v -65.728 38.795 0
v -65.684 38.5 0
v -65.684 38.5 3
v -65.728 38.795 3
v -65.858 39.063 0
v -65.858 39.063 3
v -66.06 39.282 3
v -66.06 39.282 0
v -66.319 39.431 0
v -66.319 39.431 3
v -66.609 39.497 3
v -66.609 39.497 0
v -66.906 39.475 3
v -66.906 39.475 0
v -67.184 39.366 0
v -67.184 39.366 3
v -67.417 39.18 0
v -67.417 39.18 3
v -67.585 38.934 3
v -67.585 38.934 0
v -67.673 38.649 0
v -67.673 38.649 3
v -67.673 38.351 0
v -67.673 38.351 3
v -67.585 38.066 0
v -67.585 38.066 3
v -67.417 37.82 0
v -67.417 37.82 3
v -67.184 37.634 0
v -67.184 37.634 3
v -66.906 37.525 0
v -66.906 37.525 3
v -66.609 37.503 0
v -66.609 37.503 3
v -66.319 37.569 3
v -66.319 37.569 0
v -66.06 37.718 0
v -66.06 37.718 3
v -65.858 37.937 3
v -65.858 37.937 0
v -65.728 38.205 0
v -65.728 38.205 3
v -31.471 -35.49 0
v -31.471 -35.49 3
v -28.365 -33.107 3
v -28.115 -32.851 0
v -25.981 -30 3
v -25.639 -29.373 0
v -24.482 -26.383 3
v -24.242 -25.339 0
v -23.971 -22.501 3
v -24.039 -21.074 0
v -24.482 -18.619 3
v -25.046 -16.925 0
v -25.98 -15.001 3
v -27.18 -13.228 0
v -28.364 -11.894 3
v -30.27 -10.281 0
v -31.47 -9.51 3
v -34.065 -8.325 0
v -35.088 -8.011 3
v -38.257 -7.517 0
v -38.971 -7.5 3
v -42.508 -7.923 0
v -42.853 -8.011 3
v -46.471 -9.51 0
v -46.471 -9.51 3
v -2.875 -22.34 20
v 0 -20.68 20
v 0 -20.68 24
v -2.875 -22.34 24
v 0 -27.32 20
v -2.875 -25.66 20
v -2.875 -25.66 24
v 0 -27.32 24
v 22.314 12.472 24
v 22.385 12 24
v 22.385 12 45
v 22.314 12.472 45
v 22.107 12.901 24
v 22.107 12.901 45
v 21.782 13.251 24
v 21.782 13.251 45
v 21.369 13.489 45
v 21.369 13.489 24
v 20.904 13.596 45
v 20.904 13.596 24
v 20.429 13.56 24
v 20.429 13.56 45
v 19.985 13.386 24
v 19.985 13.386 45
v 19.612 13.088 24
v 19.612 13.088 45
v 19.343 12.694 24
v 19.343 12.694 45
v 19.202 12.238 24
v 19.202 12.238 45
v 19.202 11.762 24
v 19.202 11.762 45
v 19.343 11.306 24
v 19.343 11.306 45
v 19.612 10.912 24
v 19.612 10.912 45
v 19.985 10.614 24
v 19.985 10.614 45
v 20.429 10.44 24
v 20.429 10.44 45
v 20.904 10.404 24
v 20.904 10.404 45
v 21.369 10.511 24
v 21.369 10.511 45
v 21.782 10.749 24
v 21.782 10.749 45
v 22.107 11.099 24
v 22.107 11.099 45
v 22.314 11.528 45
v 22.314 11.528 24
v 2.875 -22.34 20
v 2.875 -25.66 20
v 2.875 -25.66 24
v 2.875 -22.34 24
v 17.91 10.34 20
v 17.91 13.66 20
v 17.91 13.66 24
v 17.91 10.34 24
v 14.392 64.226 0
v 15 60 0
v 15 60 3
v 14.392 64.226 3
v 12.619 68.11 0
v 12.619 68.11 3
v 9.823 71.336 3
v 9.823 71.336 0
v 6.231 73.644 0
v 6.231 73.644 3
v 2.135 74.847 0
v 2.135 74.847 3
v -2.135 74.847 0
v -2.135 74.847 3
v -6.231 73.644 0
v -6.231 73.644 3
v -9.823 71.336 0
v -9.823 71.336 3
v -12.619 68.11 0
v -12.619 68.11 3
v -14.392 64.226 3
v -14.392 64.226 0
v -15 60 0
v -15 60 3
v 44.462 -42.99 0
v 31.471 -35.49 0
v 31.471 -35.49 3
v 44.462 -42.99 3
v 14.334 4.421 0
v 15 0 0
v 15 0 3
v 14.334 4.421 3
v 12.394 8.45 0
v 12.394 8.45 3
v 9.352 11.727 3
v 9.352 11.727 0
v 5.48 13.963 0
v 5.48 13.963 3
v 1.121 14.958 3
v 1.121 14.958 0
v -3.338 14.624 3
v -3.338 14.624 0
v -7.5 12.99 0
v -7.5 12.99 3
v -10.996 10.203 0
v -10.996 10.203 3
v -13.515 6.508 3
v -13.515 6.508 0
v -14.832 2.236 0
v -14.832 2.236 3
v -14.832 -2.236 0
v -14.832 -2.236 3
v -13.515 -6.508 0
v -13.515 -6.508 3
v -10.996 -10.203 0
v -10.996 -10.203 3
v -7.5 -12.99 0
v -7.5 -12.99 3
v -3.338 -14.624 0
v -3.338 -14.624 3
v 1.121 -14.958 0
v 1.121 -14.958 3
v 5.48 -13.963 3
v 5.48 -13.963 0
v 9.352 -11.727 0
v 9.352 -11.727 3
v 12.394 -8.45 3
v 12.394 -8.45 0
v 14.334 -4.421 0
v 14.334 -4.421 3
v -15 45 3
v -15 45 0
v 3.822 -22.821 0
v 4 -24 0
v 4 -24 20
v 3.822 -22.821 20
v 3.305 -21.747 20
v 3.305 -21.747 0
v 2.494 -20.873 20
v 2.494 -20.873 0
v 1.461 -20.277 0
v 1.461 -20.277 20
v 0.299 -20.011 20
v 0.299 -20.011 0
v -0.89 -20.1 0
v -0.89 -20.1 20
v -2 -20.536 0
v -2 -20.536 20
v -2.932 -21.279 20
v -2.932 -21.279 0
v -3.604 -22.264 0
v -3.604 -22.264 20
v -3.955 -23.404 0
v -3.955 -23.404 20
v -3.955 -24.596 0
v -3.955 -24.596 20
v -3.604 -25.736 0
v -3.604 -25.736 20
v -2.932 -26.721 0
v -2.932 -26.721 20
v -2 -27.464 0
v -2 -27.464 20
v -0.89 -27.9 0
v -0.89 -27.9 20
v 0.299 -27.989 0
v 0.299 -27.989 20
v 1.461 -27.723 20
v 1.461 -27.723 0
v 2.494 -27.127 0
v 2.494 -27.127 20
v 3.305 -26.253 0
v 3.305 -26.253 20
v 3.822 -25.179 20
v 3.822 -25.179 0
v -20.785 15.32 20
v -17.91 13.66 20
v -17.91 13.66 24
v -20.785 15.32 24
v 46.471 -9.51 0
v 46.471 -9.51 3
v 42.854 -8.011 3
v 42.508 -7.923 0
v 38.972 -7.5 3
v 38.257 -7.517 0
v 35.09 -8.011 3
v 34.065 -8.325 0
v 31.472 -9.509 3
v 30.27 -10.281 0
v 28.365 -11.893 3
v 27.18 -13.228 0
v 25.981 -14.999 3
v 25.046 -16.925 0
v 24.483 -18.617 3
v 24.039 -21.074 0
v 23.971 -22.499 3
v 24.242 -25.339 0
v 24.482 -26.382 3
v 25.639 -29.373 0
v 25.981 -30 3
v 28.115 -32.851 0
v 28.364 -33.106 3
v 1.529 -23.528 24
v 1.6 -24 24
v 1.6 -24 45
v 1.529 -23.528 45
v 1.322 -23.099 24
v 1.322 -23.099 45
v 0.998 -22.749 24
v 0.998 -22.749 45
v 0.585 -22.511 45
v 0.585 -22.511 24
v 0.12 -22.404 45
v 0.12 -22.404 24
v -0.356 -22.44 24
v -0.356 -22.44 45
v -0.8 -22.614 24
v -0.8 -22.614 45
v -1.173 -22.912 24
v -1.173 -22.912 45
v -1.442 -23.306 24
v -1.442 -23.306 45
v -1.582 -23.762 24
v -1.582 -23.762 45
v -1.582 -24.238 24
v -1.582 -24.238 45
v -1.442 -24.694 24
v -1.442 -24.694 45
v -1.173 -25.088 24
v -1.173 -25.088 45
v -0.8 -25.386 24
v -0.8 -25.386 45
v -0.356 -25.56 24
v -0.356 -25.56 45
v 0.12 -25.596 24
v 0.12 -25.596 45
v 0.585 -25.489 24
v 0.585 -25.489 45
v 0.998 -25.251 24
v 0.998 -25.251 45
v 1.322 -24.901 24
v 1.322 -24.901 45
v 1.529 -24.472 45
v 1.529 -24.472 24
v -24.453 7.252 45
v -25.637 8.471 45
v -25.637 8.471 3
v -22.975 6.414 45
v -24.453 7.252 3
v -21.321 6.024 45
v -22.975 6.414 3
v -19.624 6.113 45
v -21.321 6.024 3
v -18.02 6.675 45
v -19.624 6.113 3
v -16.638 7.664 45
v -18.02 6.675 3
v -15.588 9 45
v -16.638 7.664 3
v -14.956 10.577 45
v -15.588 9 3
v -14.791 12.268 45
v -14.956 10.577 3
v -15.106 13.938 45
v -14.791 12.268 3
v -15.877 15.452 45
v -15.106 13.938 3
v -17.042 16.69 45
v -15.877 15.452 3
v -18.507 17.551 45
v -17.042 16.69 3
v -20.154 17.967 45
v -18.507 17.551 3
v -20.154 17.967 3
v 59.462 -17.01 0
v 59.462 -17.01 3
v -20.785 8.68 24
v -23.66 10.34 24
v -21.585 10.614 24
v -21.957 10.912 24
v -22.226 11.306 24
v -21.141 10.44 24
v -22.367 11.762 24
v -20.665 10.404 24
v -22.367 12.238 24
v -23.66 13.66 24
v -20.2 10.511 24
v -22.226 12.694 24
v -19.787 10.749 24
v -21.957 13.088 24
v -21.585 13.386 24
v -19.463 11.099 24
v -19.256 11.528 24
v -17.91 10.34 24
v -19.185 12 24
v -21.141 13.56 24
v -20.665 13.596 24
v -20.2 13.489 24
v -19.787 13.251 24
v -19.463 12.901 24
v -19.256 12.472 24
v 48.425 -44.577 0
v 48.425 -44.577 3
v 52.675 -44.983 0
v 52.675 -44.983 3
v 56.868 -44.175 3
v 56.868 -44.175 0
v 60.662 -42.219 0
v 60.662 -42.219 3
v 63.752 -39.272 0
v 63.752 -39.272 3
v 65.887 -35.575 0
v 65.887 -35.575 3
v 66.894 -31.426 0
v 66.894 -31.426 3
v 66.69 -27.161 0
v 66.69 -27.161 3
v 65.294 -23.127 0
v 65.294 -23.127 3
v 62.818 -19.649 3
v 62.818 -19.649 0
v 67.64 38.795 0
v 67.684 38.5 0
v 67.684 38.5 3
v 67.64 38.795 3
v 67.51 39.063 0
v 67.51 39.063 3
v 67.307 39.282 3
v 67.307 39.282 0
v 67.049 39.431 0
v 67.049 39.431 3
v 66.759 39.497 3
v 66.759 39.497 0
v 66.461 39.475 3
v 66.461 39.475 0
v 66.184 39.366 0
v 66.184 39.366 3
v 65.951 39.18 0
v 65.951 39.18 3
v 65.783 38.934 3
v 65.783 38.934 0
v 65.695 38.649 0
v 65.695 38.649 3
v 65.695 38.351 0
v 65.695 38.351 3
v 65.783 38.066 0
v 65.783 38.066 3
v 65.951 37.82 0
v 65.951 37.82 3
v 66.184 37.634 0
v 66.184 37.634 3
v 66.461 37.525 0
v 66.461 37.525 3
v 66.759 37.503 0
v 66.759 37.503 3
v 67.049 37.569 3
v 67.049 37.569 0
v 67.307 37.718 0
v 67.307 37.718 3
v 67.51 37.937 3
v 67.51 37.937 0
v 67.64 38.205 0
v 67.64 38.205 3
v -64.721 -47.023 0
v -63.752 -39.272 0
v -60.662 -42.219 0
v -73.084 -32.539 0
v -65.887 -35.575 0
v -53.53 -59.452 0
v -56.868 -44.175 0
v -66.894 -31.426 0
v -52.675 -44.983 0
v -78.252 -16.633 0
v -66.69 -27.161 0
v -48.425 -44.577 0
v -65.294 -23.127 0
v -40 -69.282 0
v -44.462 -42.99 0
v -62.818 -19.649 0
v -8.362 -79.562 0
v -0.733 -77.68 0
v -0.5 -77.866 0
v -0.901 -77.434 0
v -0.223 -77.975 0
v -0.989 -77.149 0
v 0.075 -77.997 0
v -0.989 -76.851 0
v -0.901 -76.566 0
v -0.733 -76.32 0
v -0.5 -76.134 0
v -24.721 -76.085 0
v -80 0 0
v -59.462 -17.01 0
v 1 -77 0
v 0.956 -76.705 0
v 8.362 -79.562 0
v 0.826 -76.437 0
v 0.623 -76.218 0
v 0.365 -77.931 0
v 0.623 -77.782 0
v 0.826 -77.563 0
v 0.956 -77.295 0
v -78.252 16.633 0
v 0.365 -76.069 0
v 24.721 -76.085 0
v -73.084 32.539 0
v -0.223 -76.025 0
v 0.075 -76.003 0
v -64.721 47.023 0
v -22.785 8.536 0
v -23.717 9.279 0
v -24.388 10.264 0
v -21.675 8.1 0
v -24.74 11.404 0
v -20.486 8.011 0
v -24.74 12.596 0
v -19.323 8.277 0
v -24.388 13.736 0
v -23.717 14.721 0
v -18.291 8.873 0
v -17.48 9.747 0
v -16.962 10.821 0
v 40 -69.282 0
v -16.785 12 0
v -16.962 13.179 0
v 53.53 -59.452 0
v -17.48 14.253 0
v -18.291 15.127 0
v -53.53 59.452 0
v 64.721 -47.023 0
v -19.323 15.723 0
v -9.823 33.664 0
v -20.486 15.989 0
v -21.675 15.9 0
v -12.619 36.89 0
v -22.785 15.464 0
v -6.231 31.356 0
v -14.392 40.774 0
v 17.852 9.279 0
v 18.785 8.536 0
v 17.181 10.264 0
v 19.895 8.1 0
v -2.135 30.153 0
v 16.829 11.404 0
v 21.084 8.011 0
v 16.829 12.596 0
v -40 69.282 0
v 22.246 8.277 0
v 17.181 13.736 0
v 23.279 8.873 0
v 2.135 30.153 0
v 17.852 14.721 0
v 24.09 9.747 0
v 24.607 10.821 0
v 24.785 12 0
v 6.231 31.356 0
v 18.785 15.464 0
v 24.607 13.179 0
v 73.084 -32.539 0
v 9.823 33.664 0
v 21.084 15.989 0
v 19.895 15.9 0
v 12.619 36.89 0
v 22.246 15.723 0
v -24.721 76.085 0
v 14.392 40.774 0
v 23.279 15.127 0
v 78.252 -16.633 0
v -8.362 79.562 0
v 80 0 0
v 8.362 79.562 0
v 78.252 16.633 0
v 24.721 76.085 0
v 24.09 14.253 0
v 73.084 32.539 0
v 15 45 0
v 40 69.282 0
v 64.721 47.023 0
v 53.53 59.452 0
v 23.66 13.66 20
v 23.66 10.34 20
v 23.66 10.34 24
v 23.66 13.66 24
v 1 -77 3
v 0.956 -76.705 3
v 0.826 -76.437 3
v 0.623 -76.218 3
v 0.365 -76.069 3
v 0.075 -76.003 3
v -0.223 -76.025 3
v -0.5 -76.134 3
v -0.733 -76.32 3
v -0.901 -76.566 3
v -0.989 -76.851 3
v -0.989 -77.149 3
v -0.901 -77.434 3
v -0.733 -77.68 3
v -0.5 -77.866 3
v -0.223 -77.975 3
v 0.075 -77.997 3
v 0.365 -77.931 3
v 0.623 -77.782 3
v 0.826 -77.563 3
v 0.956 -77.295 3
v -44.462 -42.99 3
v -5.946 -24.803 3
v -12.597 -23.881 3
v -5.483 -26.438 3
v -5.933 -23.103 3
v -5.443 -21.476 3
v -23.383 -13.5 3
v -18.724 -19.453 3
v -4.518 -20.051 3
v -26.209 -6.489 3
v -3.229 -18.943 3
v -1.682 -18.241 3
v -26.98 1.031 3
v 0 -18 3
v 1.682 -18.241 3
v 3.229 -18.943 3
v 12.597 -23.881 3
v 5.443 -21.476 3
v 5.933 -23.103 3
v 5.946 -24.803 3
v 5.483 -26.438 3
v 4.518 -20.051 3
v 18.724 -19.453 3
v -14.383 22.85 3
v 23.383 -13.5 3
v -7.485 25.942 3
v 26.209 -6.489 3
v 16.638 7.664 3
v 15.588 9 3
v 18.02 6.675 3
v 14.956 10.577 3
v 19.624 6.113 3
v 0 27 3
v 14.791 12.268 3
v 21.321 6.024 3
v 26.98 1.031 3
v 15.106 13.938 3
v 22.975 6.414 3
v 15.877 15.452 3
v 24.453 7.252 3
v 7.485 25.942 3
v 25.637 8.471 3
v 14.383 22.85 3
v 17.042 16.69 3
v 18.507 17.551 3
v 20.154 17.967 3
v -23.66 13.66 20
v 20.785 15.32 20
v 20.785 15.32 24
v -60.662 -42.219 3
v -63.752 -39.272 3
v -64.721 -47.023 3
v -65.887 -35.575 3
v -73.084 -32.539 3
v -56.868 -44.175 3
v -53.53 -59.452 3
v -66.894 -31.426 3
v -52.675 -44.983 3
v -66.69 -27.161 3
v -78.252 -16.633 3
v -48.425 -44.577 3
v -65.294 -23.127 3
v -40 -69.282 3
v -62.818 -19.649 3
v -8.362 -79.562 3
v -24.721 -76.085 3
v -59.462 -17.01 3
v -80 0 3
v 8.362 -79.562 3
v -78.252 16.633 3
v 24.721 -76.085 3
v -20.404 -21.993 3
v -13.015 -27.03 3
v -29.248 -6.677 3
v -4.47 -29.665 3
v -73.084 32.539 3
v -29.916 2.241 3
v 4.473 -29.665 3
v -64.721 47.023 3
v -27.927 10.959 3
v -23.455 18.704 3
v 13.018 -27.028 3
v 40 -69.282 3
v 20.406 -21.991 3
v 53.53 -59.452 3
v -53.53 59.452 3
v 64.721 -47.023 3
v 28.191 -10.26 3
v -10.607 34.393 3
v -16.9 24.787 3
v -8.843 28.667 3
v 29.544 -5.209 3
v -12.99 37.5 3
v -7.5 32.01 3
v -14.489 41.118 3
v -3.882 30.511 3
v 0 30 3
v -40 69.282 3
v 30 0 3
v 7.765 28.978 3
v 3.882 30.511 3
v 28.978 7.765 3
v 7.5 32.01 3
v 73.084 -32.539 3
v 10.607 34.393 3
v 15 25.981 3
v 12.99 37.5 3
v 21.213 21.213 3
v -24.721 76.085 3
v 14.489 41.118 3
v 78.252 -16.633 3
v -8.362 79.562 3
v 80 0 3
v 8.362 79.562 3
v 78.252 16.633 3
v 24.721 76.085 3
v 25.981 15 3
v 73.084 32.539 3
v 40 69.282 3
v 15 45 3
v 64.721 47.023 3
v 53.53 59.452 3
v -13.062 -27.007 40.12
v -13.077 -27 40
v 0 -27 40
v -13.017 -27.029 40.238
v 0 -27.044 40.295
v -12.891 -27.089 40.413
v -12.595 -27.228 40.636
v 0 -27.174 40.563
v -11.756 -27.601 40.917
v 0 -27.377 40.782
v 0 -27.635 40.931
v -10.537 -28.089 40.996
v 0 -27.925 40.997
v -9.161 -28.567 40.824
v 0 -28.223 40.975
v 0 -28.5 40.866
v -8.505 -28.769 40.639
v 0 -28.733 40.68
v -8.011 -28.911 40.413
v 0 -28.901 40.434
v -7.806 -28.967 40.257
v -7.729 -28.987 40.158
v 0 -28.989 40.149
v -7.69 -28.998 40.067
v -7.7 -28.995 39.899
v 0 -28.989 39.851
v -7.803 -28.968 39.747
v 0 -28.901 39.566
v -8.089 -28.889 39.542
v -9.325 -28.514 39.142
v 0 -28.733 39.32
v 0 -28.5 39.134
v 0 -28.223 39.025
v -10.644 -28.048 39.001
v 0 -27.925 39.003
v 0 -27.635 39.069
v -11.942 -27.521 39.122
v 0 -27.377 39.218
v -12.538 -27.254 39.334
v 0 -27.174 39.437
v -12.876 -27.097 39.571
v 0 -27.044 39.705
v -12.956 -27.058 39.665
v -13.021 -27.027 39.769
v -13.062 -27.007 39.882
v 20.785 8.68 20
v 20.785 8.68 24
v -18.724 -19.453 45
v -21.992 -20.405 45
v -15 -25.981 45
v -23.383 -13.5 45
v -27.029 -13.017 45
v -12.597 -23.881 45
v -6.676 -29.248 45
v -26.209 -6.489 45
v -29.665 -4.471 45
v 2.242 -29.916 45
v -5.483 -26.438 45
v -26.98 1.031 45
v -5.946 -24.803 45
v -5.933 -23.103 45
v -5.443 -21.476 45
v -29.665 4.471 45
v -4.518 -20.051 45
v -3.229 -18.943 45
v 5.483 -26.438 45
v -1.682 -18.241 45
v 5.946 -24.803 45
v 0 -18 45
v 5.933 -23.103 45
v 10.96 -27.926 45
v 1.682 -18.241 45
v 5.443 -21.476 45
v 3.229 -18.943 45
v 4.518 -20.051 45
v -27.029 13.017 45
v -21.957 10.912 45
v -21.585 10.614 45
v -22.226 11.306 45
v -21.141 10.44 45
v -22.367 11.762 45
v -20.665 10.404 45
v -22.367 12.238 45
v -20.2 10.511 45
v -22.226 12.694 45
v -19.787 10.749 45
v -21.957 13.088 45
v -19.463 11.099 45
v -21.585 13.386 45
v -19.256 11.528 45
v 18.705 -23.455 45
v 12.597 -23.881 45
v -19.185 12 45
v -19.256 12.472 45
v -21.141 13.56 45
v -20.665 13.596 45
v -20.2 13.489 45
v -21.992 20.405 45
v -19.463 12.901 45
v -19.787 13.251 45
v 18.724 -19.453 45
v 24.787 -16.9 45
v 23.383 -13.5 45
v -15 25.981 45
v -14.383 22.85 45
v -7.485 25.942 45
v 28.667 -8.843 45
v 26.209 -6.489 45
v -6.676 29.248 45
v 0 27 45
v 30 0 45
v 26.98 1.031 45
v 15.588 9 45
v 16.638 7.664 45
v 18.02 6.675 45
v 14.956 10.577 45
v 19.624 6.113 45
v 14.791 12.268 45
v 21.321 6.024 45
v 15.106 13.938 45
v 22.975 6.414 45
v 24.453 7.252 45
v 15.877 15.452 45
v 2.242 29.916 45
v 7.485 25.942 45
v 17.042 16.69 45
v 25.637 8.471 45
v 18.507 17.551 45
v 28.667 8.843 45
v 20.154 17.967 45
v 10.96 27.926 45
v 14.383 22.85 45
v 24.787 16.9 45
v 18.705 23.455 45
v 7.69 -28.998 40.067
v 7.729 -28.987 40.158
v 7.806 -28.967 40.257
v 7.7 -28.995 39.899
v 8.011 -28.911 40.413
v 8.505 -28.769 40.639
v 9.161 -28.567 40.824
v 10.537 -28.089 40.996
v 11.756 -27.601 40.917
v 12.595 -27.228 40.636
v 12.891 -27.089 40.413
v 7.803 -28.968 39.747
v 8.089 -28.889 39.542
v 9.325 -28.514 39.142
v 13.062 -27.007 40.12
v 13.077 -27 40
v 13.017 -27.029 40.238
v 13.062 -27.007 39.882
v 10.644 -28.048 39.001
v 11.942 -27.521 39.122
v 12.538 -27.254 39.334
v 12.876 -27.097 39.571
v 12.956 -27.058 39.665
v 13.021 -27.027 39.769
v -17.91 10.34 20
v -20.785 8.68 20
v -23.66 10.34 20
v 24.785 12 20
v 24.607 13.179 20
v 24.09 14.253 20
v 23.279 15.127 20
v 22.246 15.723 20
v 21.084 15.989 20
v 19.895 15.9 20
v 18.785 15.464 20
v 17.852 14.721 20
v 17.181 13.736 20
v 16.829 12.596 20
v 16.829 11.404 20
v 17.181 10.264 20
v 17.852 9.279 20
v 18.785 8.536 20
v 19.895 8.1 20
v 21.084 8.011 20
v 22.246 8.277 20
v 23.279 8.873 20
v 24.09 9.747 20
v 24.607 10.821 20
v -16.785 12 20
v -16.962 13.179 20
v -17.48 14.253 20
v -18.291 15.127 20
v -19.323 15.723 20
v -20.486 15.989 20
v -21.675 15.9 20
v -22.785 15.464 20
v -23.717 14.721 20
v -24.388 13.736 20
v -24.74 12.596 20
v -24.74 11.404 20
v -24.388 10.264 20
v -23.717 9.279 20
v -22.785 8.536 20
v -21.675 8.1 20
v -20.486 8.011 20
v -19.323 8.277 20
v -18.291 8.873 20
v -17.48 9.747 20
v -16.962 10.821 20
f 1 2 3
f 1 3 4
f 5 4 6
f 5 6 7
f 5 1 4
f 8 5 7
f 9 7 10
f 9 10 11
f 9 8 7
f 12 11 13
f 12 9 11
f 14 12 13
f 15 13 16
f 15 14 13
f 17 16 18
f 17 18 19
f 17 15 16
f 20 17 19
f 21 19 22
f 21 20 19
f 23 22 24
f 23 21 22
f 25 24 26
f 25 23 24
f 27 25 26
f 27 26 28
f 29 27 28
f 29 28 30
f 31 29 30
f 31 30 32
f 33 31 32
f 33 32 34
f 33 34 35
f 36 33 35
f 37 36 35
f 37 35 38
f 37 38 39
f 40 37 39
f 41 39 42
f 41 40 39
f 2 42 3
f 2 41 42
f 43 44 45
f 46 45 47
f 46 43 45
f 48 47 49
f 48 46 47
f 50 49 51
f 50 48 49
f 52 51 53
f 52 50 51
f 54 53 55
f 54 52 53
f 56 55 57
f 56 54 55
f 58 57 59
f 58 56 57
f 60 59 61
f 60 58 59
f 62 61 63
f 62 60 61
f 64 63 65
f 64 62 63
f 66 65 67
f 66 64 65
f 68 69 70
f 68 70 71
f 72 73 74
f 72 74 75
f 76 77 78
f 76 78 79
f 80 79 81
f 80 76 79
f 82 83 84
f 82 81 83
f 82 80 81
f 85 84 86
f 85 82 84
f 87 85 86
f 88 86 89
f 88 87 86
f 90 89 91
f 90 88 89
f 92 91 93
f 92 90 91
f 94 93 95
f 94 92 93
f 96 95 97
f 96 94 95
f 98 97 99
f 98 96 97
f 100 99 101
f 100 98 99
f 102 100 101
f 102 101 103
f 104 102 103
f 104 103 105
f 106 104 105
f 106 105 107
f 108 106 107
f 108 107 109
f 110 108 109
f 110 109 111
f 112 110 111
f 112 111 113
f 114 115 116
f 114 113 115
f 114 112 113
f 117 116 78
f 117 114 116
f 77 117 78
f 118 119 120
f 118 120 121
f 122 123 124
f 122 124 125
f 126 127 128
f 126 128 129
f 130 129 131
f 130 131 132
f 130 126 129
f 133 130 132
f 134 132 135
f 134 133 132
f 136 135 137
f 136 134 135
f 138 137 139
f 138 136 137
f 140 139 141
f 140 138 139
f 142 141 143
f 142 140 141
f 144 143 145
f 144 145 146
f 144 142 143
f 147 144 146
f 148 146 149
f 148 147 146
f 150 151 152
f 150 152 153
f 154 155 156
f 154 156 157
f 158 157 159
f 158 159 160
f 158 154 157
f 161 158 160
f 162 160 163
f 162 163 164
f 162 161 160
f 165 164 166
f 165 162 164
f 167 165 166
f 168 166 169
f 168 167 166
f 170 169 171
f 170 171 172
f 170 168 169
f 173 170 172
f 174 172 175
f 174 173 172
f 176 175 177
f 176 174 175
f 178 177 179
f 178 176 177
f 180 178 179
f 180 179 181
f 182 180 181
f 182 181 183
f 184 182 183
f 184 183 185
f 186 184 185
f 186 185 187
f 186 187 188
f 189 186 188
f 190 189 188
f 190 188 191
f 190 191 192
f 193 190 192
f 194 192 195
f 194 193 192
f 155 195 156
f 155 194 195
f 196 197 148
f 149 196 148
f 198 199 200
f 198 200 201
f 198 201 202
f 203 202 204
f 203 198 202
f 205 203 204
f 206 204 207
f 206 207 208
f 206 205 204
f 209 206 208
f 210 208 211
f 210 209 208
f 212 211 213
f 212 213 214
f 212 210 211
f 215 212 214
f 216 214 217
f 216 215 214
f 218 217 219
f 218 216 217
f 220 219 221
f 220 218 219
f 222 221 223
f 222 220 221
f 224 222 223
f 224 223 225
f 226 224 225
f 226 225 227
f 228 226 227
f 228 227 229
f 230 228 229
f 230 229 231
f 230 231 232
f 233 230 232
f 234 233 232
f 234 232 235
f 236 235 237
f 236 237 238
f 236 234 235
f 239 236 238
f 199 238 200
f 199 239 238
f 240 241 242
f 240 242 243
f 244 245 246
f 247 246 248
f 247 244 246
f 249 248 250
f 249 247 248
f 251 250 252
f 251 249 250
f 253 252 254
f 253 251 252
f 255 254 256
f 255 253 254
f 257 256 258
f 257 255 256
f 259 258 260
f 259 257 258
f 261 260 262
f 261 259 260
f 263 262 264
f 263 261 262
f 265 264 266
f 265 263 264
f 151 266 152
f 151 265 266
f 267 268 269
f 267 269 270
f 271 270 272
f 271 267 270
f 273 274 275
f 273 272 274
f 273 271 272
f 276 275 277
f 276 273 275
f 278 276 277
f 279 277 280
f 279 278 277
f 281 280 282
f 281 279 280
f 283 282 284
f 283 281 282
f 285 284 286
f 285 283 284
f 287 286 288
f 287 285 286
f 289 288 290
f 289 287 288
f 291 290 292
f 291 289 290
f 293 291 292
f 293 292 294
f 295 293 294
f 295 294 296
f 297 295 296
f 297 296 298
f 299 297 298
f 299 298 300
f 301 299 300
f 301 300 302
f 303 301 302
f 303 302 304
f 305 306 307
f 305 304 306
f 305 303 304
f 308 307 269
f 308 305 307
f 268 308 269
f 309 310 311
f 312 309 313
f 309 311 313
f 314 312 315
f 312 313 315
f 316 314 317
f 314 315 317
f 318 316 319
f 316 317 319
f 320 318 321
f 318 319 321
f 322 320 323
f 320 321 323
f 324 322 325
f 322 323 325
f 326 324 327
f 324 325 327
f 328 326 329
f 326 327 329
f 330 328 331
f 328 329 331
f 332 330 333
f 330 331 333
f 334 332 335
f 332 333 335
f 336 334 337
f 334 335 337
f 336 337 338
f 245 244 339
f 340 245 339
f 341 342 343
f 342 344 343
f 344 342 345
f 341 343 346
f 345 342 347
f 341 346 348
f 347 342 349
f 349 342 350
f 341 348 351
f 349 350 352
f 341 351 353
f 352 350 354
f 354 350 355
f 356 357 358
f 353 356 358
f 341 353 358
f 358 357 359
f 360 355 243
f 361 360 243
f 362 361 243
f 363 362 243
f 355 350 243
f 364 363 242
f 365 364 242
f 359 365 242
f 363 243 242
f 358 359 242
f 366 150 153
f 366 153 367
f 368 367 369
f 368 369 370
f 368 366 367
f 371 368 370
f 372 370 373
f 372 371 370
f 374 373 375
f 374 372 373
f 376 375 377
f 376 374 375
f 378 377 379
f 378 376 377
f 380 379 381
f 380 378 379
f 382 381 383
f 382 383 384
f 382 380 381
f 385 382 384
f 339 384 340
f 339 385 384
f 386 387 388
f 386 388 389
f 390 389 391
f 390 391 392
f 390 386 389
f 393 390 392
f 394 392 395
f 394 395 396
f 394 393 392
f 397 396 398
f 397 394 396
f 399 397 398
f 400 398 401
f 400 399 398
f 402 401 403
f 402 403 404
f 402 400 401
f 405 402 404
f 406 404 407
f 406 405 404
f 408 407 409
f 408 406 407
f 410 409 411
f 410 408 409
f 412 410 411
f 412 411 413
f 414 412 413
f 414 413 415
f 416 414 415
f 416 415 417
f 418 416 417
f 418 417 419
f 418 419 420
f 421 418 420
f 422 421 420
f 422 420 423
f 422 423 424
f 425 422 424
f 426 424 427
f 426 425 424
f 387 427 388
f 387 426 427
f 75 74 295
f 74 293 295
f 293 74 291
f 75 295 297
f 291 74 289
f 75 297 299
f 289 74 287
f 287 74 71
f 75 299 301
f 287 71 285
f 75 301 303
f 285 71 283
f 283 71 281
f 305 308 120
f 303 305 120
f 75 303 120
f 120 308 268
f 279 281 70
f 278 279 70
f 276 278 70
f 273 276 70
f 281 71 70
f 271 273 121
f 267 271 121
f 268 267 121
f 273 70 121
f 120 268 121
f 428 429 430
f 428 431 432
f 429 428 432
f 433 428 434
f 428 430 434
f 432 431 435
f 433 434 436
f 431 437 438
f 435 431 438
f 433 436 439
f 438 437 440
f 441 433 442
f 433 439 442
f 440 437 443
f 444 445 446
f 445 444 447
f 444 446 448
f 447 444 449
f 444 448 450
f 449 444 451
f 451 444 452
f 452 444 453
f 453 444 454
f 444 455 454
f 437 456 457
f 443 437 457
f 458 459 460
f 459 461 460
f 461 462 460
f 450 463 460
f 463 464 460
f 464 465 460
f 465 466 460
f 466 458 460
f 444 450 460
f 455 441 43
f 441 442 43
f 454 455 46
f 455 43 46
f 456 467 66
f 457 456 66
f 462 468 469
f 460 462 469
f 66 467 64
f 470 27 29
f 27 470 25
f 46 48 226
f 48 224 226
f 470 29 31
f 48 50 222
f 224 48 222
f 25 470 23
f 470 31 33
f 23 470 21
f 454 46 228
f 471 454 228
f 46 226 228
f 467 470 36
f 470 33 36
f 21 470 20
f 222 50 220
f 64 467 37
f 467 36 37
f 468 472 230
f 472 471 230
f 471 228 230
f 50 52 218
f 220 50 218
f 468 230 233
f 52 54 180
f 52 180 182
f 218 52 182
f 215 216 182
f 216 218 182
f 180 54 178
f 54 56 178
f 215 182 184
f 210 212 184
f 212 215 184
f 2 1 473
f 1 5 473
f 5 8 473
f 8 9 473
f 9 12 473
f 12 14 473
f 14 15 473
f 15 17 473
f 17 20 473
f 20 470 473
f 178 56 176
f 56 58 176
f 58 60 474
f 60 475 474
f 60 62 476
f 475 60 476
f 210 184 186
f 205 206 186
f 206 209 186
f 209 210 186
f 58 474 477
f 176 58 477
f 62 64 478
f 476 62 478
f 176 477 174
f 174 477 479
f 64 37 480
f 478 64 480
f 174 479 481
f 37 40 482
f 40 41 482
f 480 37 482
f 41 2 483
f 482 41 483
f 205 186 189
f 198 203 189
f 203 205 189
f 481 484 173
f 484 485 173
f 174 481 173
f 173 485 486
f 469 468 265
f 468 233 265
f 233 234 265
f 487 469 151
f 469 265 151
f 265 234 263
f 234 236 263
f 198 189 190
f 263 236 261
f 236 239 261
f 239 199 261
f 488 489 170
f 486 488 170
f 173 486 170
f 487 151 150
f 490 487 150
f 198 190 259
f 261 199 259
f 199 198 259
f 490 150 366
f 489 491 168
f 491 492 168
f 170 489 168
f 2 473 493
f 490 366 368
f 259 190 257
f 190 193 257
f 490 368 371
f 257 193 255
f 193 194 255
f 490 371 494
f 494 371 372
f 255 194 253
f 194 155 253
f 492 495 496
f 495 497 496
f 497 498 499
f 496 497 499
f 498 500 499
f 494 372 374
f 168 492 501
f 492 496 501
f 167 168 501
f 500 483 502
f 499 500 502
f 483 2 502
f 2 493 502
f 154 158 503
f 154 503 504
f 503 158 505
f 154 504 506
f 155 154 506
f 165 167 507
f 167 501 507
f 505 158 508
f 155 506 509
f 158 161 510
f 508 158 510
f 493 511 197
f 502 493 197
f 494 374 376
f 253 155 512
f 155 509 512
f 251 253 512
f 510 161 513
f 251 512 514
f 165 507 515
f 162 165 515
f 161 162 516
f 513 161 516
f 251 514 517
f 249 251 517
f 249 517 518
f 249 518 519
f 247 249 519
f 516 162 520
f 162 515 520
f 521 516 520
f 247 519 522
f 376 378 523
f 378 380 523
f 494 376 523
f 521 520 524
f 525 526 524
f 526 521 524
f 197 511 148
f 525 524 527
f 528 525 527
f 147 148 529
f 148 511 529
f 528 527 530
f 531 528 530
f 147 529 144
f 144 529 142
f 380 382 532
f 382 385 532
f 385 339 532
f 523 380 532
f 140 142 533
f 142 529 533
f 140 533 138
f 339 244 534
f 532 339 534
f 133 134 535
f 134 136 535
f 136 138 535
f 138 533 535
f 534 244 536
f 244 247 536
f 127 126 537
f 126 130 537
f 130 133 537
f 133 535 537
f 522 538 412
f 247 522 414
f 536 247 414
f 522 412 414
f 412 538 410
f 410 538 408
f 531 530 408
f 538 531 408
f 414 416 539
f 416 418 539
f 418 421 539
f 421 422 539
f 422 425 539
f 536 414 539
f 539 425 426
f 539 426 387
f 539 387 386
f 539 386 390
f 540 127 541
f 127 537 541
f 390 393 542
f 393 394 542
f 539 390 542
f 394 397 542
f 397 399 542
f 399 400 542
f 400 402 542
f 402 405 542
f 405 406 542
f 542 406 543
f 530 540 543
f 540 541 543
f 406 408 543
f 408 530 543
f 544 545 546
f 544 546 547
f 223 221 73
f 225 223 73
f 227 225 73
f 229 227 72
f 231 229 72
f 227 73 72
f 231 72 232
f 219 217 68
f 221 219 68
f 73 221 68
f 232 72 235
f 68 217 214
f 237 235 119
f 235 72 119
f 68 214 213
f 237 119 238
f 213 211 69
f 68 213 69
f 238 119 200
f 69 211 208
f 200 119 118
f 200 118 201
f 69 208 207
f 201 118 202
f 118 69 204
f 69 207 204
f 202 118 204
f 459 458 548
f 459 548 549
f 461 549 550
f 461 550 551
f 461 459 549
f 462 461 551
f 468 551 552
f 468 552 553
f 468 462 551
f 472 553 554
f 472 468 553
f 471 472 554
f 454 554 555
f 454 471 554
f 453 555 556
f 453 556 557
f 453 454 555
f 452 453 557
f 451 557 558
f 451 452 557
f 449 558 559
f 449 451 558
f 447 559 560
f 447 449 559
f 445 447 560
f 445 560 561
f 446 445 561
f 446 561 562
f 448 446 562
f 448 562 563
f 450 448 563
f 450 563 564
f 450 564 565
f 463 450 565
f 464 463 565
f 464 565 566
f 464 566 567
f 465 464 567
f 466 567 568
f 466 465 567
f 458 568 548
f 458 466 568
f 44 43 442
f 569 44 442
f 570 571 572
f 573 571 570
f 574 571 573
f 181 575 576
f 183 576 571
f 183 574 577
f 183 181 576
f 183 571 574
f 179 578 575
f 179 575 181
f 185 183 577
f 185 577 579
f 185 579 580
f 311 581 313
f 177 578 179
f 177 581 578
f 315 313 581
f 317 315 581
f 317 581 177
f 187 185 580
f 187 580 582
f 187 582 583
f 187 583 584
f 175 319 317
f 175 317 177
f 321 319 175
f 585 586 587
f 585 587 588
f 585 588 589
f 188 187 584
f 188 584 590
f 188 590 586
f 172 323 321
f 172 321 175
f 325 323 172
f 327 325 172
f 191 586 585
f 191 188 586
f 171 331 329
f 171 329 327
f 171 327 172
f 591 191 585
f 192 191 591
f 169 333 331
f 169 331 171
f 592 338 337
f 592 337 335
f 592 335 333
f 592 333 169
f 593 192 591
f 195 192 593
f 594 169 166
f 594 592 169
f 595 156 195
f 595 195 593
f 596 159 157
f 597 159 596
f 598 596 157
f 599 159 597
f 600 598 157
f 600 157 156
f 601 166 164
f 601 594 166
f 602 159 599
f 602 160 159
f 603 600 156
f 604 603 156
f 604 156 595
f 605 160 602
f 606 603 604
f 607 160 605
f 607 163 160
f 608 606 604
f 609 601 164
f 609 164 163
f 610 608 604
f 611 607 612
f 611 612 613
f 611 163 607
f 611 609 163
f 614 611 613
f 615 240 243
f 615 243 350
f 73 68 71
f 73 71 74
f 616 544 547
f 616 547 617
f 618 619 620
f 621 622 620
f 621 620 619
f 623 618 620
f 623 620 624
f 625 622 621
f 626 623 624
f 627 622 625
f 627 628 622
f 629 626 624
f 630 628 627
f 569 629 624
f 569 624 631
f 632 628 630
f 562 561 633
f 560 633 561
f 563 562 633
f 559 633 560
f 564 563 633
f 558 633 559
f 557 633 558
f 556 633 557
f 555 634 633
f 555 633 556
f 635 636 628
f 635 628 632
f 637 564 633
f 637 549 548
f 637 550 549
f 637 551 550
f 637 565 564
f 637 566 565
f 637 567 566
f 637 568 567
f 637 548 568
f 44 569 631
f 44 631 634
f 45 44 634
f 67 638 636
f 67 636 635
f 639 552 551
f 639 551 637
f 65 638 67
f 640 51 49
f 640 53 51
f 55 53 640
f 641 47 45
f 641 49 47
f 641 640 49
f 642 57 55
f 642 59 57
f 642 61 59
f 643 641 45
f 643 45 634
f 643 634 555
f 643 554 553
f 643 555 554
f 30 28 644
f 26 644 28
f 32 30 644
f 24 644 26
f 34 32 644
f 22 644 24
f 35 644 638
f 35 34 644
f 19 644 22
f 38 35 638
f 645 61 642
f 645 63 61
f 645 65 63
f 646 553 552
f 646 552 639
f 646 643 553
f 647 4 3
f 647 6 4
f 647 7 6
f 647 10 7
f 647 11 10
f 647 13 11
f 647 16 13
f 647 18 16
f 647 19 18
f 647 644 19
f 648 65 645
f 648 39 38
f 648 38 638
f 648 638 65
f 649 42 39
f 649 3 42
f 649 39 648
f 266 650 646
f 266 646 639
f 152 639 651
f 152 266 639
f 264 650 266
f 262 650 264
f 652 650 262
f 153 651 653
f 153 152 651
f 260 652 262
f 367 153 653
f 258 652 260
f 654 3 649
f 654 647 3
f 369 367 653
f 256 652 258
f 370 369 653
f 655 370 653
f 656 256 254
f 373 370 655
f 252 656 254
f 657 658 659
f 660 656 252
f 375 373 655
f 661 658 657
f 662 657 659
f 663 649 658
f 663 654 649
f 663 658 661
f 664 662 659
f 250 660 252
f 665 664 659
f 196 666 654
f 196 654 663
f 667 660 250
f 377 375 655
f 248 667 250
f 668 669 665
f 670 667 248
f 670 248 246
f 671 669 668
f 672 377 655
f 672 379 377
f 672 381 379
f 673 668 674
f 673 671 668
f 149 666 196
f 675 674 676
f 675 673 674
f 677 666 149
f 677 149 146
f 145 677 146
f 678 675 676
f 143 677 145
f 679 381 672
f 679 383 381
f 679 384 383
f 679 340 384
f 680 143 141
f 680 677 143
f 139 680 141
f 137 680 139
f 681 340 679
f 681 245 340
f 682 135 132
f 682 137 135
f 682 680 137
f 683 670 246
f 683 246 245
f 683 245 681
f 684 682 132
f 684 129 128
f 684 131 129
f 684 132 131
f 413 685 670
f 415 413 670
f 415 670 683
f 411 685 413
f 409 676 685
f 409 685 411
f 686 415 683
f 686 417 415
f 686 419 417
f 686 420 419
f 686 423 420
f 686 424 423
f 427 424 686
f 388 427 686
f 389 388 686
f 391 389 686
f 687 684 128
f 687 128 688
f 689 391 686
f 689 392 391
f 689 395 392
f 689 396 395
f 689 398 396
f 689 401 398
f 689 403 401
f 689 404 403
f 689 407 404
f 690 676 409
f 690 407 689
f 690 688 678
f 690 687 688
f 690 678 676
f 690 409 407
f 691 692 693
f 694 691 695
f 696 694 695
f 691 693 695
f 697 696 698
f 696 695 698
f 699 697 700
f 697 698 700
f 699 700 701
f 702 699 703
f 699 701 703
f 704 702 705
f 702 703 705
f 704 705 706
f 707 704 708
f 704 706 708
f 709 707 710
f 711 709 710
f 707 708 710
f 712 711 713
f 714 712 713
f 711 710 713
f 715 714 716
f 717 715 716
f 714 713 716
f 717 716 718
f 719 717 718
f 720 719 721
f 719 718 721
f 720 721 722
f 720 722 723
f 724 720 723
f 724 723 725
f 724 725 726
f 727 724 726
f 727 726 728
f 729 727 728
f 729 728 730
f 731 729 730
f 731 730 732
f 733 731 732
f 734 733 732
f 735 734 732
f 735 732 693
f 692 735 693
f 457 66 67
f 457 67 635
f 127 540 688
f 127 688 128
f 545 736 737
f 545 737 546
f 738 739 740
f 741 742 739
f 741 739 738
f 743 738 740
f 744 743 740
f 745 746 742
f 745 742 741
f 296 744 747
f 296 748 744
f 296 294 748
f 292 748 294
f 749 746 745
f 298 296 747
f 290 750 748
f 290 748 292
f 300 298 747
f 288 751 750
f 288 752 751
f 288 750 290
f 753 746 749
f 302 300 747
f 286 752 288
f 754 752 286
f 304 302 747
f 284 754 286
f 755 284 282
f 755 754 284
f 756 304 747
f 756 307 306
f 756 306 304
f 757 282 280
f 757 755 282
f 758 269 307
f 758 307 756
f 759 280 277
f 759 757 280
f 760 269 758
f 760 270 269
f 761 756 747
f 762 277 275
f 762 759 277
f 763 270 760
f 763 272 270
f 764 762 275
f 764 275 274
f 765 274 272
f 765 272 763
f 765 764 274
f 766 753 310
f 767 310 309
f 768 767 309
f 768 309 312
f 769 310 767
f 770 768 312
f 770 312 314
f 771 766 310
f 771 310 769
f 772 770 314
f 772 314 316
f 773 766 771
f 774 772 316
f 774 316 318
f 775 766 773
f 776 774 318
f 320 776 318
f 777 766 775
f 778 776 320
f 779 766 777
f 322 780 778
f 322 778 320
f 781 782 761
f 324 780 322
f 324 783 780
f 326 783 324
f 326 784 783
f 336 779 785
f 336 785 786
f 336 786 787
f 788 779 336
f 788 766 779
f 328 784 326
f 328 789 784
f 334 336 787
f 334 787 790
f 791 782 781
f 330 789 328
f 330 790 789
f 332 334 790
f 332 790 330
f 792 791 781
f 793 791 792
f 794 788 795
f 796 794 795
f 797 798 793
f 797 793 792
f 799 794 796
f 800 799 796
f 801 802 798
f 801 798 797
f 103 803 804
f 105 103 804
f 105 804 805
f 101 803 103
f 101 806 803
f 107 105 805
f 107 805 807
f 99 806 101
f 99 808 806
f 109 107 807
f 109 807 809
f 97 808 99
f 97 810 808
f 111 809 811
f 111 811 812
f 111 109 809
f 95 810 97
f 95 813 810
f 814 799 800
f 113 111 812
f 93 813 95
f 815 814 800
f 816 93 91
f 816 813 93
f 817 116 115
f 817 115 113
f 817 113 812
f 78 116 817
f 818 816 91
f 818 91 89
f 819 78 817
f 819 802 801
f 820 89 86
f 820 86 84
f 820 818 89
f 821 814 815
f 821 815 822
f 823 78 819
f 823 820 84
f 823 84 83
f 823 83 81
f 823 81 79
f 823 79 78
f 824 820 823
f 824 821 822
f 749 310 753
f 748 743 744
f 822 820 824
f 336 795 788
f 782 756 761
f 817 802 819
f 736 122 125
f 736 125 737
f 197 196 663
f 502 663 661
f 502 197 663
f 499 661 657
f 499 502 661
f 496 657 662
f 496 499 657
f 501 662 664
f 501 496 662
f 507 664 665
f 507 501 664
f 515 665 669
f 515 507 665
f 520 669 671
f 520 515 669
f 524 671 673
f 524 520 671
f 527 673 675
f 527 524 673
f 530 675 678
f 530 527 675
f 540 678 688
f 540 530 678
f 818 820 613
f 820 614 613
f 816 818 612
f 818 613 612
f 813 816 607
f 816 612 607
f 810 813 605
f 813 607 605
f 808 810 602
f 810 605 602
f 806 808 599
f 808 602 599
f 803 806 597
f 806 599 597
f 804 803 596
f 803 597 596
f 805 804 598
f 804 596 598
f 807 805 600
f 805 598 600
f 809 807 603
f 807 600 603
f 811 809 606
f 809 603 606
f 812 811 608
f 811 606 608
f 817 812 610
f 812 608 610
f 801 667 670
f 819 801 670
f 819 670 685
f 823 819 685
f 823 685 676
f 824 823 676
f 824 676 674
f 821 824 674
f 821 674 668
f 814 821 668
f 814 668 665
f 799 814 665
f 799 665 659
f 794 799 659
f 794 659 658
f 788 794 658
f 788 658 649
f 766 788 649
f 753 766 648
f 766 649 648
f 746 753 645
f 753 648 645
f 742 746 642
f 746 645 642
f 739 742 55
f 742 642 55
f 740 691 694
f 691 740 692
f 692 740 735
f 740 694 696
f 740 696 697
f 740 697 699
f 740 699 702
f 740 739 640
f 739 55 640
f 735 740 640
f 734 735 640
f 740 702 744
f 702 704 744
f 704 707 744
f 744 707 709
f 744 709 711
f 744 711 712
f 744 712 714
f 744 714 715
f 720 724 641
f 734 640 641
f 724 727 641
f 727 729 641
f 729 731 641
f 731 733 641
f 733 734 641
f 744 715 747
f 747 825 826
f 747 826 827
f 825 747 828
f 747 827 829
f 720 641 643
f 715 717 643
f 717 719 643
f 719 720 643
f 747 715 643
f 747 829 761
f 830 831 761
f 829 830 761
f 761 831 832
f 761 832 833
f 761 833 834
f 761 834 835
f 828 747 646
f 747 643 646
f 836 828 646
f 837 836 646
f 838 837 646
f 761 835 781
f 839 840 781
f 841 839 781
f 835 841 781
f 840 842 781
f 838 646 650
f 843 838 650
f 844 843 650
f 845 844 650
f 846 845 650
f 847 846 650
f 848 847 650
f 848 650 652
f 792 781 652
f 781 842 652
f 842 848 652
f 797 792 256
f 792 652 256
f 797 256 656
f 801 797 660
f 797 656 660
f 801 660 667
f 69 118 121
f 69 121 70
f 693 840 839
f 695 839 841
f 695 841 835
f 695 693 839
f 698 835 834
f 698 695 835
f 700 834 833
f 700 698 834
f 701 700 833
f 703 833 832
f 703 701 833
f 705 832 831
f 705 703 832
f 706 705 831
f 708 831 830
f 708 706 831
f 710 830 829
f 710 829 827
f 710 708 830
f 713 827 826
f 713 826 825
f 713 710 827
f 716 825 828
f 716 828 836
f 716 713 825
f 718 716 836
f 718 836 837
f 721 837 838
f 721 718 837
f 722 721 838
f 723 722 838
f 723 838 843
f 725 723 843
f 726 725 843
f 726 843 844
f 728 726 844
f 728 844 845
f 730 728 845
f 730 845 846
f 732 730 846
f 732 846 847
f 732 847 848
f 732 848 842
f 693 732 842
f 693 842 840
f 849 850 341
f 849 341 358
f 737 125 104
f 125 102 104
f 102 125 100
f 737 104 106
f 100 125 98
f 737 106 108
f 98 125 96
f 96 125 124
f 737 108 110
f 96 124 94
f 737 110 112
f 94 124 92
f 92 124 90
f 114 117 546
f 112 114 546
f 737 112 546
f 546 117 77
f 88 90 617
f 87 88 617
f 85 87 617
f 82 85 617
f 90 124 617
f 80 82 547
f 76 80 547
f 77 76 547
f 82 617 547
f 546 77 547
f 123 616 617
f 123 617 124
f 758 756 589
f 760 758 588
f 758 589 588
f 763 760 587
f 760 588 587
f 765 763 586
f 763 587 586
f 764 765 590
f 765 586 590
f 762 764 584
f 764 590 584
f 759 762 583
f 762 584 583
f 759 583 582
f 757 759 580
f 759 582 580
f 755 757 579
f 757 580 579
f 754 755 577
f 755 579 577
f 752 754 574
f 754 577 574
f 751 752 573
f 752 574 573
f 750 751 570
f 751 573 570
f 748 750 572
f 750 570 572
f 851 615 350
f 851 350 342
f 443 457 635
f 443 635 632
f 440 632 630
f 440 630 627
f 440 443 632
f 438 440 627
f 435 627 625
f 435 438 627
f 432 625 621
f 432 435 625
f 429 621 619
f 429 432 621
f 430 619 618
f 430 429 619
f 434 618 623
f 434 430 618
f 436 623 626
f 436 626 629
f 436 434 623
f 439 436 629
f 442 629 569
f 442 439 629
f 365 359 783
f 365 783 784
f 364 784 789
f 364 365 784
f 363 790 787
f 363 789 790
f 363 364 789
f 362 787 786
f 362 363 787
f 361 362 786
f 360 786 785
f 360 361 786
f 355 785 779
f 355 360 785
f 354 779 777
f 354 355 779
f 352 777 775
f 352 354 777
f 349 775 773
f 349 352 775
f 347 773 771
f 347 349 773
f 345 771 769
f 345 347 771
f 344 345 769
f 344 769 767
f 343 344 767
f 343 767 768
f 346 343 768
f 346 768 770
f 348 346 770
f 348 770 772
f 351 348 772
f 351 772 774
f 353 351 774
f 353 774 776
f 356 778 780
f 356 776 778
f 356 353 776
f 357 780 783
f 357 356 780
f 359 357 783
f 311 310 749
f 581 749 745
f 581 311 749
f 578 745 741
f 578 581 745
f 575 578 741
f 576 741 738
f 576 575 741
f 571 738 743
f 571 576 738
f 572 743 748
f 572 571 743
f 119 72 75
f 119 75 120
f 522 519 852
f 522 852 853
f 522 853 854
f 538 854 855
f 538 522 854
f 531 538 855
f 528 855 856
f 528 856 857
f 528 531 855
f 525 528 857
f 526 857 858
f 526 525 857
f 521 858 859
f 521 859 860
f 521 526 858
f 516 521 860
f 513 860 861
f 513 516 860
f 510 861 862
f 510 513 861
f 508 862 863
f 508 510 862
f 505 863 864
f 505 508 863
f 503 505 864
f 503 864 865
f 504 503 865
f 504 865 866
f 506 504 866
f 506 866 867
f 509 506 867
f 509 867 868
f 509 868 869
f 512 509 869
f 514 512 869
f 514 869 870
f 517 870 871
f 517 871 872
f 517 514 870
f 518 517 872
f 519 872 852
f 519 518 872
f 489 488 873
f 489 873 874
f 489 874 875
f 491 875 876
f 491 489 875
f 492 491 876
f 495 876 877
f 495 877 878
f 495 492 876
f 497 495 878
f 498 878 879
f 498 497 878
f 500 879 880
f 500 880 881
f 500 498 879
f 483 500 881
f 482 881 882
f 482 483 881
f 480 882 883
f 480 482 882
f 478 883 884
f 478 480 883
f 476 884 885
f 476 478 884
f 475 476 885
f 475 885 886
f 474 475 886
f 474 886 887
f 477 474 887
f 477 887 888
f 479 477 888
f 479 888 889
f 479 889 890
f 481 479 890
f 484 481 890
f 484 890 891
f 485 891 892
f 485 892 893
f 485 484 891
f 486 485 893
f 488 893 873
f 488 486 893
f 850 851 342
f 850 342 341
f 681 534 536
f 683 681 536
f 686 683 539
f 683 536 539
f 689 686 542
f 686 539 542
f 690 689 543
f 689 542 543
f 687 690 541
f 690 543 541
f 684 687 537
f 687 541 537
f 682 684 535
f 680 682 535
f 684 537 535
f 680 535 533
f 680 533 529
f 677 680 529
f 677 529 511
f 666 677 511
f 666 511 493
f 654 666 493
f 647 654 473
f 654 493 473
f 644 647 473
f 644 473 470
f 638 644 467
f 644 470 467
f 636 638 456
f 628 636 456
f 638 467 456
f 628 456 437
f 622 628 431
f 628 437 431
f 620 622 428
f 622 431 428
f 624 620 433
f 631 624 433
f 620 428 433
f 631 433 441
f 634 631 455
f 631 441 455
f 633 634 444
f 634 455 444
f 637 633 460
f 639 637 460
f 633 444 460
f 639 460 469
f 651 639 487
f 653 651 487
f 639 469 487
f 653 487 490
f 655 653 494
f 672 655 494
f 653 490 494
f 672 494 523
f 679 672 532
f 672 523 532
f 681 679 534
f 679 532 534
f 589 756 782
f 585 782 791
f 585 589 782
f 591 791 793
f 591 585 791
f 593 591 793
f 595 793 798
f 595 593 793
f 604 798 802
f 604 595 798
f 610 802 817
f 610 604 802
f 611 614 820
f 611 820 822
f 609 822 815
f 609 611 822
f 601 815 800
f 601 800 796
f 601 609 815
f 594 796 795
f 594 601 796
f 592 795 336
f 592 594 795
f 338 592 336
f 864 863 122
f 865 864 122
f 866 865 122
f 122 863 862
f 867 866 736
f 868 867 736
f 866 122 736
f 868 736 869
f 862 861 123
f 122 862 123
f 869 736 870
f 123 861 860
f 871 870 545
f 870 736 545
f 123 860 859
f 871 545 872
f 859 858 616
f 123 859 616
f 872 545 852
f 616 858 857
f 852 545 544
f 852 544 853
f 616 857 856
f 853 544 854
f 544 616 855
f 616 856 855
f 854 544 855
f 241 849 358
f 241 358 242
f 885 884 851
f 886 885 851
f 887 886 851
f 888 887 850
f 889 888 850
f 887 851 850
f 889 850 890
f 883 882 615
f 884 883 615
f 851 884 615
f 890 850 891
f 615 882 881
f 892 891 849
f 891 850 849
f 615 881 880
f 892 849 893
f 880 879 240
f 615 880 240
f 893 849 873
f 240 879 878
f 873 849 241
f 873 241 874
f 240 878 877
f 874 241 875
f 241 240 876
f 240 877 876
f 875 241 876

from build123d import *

# Parameters (mm, degrees)
SKETCH_R             = 80
SKETCH_R_2           = 15
SKETCH_R_3           = 1
PAD_DEPTH            = 3
SKETCH001_R          = 30
SKETCH001_R_2        = 27
PAD001_DEPTH         = 45
SKETCH002_R          = 6
PAD002_DEPTH         = 45
SKETCH004_R          = 1.6
POCKET_DEPTH         = 45.001
SKETCH003_R          = 4
POCKET001_DEPTH      = 20
SKETCH005_R          = 1
POCKET002_DEPTH      = 80.001
POCKET002_DEPTH_BACK = -80.001
POCKET003_DEPTH      = 24


with BuildPart() as part:
    # Sketch → Pad (new body)
    with BuildSketch(Plane.XY):
        Circle(SKETCH_R)
        Circle(SKETCH_R_2, mode=Mode.SUBTRACT)
        with Locations((-66.683956, 38.5)):
            Circle(SKETCH_R_3, mode=Mode.SUBTRACT)
        with Locations((66.683956, 38.5)):
            Circle(SKETCH_R_3, mode=Mode.SUBTRACT)
        with Locations((0, -77)):
            Circle(SKETCH_R_3, mode=Mode.SUBTRACT)
        with BuildLine():
            ThreePointArc((-15, 45), (0, 30), (15, 45))
            Line((15, 45), (15, 60))
            ThreePointArc((15, 60), (0, 75), (-15, 60))
            Line((-15, 45), (-15, 60))
        make_face(mode=Mode.SUBTRACT)
        with BuildLine():
            ThreePointArc((-31.471143, -35.490381), (-25.980762, -15), (-46.471143, -9.509619))
            Line((-46.471143, -9.509619), (-59.461524, -17.009619))
            ThreePointArc((-59.461524, -17.009619), (-64.951905, -37.5), (-44.461524, -42.990381))
            Line((-31.471143, -35.490381), (-44.461524, -42.990381))
        make_face(mode=Mode.SUBTRACT)
        with BuildLine():
            ThreePointArc((46.471143, -9.509619), (25.980762, -15), (31.471143, -35.490381))
            Line((31.471143, -35.490381), (44.461524, -42.990381))
            ThreePointArc((44.461524, -42.990381), (64.951905, -37.5), (59.461524, -17.009619))
            Line((46.471143, -9.509619), (59.461524, -17.009619))
        make_face(mode=Mode.SUBTRACT)
    extrude(amount=PAD_DEPTH)

    # Sketch001 → Pad001 (join)
    with BuildSketch(Plane.XY):
        Circle(SKETCH001_R)
        Circle(SKETCH001_R_2, mode=Mode.SUBTRACT)
    extrude(amount=PAD001_DEPTH)

    # Sketch002 → Pad002 (join)
    with BuildSketch(Plane.XY):
        with Locations((-20.78461, 12)):
            Circle(SKETCH002_R)
        with Locations((0, -24)):
            Circle(SKETCH002_R)
        with Locations((20.78461, 12)):
            Circle(SKETCH002_R)
    extrude(amount=PAD002_DEPTH)

    # Sketch004 → Pocket (cut, through all)
    with BuildSketch(Plane.XY):
        with Locations((-20.78461, 12)):
            Circle(SKETCH004_R)
        with Locations((20.78461, 12)):
            Circle(SKETCH004_R)
        with Locations((0, -24)):
            Circle(SKETCH004_R)
    extrude(amount=POCKET_DEPTH, mode=Mode.SUBTRACT)

    # Sketch003 → Pocket001 (cut)
    with BuildSketch(Plane.XY):
        with Locations((-20.78461, 12)):
            Circle(SKETCH003_R)
        with Locations((20.78461, 12)):
            Circle(SKETCH003_R)
        with Locations((0, -24)):
            Circle(SKETCH003_R)
    extrude(amount=POCKET001_DEPTH, mode=Mode.SUBTRACT)

    # Sketch005 → Pocket002 (cut, two sides)
    with BuildSketch(Plane.YZ) as pocket002_sk:
        with Locations((-28, 40)):
            Circle(SKETCH005_R)
    extrude(amount=-POCKET002_DEPTH, mode=Mode.SUBTRACT)
    extrude(pocket002_sk.sketch, amount=-POCKET002_DEPTH_BACK, mode=Mode.SUBTRACT)

    # Sketch006 → Pocket003 (cut)
    with BuildSketch(Plane.XY):
        Polygon((-17.90961, 10.340118), (-17.90961, 13.659882), (-20.78461, 15.319764), (-23.65961, 13.659882), (-23.65961, 10.340118), (-20.78461, 8.680236), align=None)
        Polygon((20.78461, 8.680236), (23.65961, 10.340118), (23.65961, 13.659882), (20.78461, 15.319764), (17.90961, 13.659882), (17.90961, 10.340118), align=None)
        Polygon((2.875, -25.659882), (2.875, -22.340118), (0, -20.680236), (-2.875, -22.340118), (-2.875, -25.659882), (0, -27.319764), align=None)
    extrude(amount=POCKET003_DEPTH, mode=Mode.SUBTRACT)


solid = part.part
